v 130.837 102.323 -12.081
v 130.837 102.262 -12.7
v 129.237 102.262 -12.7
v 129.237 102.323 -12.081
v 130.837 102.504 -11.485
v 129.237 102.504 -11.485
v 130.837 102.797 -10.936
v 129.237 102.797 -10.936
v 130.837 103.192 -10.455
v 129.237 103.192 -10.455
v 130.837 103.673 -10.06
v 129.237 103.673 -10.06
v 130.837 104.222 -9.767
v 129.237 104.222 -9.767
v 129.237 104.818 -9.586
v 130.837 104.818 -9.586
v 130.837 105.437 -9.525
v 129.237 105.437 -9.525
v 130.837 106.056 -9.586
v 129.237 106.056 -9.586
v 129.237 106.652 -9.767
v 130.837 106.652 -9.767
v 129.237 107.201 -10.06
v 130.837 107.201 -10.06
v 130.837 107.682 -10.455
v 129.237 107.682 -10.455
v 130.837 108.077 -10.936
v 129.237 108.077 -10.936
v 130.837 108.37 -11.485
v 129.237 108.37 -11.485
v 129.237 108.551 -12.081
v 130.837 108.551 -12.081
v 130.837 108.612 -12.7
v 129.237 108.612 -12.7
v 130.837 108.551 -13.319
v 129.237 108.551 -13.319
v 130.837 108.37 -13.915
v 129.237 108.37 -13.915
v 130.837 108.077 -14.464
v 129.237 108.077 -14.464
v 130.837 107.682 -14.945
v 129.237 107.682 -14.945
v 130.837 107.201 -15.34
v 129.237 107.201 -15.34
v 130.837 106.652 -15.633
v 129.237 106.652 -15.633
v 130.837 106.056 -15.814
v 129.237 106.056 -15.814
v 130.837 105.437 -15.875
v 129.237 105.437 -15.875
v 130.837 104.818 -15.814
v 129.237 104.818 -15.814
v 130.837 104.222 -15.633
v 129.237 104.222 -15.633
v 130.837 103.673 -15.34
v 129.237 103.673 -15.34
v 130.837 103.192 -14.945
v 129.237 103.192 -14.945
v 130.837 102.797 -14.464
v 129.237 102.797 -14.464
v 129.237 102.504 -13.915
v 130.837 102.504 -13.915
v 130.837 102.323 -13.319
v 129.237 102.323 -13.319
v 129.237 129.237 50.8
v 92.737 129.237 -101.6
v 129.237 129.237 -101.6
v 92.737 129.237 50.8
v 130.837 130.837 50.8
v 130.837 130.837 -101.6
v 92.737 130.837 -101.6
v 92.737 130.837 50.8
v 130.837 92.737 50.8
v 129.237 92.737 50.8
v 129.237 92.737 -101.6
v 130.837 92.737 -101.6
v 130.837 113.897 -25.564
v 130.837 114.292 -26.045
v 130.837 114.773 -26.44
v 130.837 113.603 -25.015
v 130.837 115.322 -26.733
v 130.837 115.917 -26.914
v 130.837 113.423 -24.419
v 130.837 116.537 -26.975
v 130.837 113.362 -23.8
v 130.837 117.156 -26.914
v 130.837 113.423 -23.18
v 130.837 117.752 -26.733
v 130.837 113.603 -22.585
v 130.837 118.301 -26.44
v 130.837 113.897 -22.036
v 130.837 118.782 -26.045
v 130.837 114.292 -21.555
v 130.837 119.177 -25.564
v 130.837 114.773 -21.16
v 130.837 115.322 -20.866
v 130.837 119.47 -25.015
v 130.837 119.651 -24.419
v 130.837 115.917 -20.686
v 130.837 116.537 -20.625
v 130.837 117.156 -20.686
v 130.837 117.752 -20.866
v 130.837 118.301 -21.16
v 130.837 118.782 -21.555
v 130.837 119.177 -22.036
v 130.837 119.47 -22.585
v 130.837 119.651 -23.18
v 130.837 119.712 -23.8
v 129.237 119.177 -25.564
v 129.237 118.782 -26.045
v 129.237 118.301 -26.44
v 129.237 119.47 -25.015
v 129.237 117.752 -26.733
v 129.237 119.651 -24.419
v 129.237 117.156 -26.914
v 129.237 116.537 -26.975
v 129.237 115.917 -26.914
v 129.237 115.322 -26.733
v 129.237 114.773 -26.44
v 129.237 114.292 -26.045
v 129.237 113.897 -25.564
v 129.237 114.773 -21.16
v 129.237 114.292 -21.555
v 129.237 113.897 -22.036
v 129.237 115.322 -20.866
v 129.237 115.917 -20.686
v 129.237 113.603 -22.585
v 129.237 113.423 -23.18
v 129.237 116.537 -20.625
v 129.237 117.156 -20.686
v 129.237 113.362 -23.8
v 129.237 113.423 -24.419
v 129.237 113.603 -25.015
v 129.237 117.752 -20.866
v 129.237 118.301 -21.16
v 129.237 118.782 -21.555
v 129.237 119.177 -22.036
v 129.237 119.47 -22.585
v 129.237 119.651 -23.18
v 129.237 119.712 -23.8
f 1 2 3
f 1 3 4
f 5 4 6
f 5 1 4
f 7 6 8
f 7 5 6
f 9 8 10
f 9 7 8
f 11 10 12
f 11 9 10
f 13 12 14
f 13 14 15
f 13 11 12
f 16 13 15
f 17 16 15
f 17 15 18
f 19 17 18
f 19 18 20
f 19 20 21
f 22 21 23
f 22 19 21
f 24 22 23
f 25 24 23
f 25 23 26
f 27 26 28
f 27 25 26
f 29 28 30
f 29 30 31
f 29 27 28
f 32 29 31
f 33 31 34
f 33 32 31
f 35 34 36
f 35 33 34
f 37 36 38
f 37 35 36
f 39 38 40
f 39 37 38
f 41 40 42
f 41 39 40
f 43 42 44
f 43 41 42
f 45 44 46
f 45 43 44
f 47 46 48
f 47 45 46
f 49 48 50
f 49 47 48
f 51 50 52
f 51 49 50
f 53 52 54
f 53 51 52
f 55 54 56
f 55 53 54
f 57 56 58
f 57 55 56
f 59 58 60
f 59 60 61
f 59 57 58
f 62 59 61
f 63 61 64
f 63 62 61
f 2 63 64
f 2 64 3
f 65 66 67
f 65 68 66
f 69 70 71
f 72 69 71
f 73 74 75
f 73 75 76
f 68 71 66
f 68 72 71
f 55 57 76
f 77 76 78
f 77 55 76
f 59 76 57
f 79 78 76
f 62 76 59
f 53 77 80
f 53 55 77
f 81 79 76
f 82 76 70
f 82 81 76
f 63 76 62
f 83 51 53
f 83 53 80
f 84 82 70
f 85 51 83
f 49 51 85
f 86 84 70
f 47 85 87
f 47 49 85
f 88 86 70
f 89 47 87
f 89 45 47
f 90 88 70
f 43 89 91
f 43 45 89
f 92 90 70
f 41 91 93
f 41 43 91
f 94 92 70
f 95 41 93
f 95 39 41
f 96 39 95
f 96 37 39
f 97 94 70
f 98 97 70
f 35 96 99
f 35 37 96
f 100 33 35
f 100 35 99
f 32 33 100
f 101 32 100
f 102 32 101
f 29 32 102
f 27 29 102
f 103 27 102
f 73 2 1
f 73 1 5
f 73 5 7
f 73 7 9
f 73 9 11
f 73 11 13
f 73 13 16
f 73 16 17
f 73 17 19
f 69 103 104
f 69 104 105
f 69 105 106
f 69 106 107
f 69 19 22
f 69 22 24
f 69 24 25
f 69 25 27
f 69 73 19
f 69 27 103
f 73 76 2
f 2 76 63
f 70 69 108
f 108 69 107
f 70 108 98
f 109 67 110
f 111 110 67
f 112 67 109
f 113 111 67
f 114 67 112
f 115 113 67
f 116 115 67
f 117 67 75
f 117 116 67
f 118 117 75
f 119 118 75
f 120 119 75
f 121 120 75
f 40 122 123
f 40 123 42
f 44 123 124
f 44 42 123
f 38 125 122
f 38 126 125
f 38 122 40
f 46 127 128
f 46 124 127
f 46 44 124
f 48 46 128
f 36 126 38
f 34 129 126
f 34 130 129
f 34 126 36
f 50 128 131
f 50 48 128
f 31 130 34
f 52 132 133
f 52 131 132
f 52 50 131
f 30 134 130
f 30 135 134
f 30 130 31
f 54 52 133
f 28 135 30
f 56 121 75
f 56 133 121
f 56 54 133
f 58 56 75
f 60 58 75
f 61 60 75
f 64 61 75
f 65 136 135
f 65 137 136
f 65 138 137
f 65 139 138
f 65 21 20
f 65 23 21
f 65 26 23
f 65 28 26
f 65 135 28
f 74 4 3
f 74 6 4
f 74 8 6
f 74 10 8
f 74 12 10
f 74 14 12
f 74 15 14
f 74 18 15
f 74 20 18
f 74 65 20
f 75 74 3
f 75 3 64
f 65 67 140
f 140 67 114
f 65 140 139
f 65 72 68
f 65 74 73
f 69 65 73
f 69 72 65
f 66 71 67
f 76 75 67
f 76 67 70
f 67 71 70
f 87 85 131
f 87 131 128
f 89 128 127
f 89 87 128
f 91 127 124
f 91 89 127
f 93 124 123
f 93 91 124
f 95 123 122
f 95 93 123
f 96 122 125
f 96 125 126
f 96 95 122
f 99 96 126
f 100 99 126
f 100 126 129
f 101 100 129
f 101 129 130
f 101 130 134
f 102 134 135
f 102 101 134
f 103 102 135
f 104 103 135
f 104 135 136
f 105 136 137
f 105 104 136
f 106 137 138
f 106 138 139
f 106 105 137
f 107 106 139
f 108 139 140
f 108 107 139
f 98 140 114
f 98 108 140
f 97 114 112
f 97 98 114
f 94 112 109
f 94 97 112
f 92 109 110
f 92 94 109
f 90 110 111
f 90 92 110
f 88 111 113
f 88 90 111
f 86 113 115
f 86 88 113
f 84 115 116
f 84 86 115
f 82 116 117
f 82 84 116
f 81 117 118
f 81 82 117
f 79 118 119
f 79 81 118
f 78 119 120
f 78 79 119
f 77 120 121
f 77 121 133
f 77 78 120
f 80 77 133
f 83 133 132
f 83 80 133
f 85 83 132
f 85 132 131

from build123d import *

# Parameters (mm, degrees)
PAD_DEPTH      = 50.8
PAD_DEPTH_BACK = 101.6
SKETCH001_R    = 3.175
POCKET_DEPTH   = 1.6002


with BuildPart() as leg1:
    # Sketch → Pad (new body, two sides)
    with BuildSketch(Plane.XY) as pad_sk:
        Polygon((0, 0), (38.1, 0), (38.1, -1.6002), (1.6002, -1.6002), (1.6002, -38.1), (0, -38.1), align=None)
    extrude(amount=PAD_DEPTH)
    extrude(pad_sk.sketch, amount=-PAD_DEPTH_BACK)

    # Sketch001 → Pocket (cut)
    with BuildSketch(Plane(origin=(0, 0, 0), x_dir=(0, -1, 0), z_dir=(-1, 0, 0))):
        with Locations((25.4, -12.7)):
            Circle(SKETCH001_R)
        with Locations((14.3002, -23.7998)):
            Circle(SKETCH001_R)
    extrude(amount=-POCKET_DEPTH, mode=Mode.SUBTRACT)


with BuildPart() as leg1_1:
    # Clone006 placement: moved
    add(leg1.part.moved(Location((-130.837, 130.837, 0))))


with BuildPart() as leg2:
    # Part__Mirroring006: instance of leg1
    add(leg1_1.part.mirror(Plane(origin=(0, 0, 0), x_dir=(1, 0, 0), z_dir=(0, 1, 0))))


with BuildPart() as leg3:
    # Part__Mirroring007: instance of leg2
    add(leg2.part.mirror(Plane(origin=(0, 0, 0), x_dir=(0, -1, 0), z_dir=(1, 0, 0))))


with BuildPart() as leg4:
    # Part__Mirroring008: instance of leg3
    add(leg3.part.mirror(Plane(origin=(0, 0, 0), x_dir=(1, 0, 0), z_dir=(0, 1, 0))))


solid = leg4.part
